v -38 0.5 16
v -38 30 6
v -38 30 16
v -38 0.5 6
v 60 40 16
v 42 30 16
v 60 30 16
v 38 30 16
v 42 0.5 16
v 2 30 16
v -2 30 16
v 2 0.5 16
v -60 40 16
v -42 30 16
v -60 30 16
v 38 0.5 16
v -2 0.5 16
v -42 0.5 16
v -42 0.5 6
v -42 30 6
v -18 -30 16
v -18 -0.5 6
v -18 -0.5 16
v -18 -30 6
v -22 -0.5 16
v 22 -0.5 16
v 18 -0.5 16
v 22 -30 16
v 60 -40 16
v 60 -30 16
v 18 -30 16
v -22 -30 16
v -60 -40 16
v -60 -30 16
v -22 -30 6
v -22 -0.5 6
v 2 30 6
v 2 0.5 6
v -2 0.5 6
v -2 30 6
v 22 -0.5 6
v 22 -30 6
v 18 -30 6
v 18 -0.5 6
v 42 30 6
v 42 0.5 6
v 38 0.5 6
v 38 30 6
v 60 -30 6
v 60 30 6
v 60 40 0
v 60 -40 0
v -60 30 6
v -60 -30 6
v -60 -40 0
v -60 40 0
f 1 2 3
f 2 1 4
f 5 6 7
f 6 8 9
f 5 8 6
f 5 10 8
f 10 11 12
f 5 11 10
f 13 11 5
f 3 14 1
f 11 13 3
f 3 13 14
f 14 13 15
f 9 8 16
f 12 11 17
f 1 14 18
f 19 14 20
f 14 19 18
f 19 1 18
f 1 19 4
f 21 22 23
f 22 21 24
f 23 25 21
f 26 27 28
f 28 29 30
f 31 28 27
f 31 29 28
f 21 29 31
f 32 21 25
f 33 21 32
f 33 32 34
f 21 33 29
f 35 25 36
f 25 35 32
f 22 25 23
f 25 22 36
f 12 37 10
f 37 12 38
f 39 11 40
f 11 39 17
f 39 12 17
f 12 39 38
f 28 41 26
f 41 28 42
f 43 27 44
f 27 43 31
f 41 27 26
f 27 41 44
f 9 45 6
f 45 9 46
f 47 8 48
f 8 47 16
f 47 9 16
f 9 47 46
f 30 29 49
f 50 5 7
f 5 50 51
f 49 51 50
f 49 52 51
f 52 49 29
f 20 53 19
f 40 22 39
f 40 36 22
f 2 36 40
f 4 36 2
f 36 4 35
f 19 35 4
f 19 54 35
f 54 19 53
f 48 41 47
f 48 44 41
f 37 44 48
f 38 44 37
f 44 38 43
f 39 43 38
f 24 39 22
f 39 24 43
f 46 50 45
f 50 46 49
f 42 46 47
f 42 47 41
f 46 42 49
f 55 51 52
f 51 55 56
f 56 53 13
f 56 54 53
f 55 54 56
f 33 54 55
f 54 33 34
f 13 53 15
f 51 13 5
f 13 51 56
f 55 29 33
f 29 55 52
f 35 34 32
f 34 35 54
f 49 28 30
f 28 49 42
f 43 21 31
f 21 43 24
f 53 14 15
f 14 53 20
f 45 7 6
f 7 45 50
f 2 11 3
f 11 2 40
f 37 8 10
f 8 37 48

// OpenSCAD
$fn = 32;

// ----------------------------------------------------------------------
// Rib frame 120 x 80 x 16
// 5 ribs at 20 mm pitch, staggered
// ----------------------------------------------------------------------

// --- parameters (mm) ---
frame = [120, 80, 6];  // base plate size (x, y, z)
rail_w = 10;           // side rail width
ribs = 5;              // number of ribs
rib_t = 4;             // rib thickness
rib_h = 10;            // rib height above the base plate
pitch = 20;            // pitch between rib centres

// --- derived feature positions (mm) ---
span = (ribs - 1) * pitch;          // = 80   distance between the outer ribs
origin_x = -span / 2;               // = -40   X of the first rib
rib_len = frame[1] / 2 - rail_w + 0.5;  // = 30.5   length of a staggered rib
rib_y = 0.5 + rib_len / 2;          // = 15.75   Y of a staggered rib centre
row_offset = 2 * rib_y;             // = 31.5   distance between the two rows
feature_centers = [
  [origin_x + 0 * pitch, rib_y],
  [origin_x + 1 * pitch, -rib_y],
  [origin_x + 2 * pitch, rib_y],
  [origin_x + 3 * pitch, -rib_y],
  [origin_x + 4 * pitch, rib_y]
];   // rib centre line, drives the rib loop

// base plate, two side rails, then the ribs read straight off feature_centers
union() {
  translate([-frame[0] / 2, -frame[1] / 2, 0]) cube(frame);
  translate([-frame[0] / 2, -frame[1] / 2, 0]) cube([frame[0], rail_w, frame[2] + rib_h]);
  translate([-frame[0] / 2, frame[1] / 2 - rail_w, 0]) cube([frame[0], rail_w, frame[2] + rib_h]);
  for (centre = feature_centers)
    translate([centre[0] - rib_t / 2, centre[1] - rib_len / 2, frame[2] - 1])
      cube([rib_t, rib_len, rib_h + 1]);
}
